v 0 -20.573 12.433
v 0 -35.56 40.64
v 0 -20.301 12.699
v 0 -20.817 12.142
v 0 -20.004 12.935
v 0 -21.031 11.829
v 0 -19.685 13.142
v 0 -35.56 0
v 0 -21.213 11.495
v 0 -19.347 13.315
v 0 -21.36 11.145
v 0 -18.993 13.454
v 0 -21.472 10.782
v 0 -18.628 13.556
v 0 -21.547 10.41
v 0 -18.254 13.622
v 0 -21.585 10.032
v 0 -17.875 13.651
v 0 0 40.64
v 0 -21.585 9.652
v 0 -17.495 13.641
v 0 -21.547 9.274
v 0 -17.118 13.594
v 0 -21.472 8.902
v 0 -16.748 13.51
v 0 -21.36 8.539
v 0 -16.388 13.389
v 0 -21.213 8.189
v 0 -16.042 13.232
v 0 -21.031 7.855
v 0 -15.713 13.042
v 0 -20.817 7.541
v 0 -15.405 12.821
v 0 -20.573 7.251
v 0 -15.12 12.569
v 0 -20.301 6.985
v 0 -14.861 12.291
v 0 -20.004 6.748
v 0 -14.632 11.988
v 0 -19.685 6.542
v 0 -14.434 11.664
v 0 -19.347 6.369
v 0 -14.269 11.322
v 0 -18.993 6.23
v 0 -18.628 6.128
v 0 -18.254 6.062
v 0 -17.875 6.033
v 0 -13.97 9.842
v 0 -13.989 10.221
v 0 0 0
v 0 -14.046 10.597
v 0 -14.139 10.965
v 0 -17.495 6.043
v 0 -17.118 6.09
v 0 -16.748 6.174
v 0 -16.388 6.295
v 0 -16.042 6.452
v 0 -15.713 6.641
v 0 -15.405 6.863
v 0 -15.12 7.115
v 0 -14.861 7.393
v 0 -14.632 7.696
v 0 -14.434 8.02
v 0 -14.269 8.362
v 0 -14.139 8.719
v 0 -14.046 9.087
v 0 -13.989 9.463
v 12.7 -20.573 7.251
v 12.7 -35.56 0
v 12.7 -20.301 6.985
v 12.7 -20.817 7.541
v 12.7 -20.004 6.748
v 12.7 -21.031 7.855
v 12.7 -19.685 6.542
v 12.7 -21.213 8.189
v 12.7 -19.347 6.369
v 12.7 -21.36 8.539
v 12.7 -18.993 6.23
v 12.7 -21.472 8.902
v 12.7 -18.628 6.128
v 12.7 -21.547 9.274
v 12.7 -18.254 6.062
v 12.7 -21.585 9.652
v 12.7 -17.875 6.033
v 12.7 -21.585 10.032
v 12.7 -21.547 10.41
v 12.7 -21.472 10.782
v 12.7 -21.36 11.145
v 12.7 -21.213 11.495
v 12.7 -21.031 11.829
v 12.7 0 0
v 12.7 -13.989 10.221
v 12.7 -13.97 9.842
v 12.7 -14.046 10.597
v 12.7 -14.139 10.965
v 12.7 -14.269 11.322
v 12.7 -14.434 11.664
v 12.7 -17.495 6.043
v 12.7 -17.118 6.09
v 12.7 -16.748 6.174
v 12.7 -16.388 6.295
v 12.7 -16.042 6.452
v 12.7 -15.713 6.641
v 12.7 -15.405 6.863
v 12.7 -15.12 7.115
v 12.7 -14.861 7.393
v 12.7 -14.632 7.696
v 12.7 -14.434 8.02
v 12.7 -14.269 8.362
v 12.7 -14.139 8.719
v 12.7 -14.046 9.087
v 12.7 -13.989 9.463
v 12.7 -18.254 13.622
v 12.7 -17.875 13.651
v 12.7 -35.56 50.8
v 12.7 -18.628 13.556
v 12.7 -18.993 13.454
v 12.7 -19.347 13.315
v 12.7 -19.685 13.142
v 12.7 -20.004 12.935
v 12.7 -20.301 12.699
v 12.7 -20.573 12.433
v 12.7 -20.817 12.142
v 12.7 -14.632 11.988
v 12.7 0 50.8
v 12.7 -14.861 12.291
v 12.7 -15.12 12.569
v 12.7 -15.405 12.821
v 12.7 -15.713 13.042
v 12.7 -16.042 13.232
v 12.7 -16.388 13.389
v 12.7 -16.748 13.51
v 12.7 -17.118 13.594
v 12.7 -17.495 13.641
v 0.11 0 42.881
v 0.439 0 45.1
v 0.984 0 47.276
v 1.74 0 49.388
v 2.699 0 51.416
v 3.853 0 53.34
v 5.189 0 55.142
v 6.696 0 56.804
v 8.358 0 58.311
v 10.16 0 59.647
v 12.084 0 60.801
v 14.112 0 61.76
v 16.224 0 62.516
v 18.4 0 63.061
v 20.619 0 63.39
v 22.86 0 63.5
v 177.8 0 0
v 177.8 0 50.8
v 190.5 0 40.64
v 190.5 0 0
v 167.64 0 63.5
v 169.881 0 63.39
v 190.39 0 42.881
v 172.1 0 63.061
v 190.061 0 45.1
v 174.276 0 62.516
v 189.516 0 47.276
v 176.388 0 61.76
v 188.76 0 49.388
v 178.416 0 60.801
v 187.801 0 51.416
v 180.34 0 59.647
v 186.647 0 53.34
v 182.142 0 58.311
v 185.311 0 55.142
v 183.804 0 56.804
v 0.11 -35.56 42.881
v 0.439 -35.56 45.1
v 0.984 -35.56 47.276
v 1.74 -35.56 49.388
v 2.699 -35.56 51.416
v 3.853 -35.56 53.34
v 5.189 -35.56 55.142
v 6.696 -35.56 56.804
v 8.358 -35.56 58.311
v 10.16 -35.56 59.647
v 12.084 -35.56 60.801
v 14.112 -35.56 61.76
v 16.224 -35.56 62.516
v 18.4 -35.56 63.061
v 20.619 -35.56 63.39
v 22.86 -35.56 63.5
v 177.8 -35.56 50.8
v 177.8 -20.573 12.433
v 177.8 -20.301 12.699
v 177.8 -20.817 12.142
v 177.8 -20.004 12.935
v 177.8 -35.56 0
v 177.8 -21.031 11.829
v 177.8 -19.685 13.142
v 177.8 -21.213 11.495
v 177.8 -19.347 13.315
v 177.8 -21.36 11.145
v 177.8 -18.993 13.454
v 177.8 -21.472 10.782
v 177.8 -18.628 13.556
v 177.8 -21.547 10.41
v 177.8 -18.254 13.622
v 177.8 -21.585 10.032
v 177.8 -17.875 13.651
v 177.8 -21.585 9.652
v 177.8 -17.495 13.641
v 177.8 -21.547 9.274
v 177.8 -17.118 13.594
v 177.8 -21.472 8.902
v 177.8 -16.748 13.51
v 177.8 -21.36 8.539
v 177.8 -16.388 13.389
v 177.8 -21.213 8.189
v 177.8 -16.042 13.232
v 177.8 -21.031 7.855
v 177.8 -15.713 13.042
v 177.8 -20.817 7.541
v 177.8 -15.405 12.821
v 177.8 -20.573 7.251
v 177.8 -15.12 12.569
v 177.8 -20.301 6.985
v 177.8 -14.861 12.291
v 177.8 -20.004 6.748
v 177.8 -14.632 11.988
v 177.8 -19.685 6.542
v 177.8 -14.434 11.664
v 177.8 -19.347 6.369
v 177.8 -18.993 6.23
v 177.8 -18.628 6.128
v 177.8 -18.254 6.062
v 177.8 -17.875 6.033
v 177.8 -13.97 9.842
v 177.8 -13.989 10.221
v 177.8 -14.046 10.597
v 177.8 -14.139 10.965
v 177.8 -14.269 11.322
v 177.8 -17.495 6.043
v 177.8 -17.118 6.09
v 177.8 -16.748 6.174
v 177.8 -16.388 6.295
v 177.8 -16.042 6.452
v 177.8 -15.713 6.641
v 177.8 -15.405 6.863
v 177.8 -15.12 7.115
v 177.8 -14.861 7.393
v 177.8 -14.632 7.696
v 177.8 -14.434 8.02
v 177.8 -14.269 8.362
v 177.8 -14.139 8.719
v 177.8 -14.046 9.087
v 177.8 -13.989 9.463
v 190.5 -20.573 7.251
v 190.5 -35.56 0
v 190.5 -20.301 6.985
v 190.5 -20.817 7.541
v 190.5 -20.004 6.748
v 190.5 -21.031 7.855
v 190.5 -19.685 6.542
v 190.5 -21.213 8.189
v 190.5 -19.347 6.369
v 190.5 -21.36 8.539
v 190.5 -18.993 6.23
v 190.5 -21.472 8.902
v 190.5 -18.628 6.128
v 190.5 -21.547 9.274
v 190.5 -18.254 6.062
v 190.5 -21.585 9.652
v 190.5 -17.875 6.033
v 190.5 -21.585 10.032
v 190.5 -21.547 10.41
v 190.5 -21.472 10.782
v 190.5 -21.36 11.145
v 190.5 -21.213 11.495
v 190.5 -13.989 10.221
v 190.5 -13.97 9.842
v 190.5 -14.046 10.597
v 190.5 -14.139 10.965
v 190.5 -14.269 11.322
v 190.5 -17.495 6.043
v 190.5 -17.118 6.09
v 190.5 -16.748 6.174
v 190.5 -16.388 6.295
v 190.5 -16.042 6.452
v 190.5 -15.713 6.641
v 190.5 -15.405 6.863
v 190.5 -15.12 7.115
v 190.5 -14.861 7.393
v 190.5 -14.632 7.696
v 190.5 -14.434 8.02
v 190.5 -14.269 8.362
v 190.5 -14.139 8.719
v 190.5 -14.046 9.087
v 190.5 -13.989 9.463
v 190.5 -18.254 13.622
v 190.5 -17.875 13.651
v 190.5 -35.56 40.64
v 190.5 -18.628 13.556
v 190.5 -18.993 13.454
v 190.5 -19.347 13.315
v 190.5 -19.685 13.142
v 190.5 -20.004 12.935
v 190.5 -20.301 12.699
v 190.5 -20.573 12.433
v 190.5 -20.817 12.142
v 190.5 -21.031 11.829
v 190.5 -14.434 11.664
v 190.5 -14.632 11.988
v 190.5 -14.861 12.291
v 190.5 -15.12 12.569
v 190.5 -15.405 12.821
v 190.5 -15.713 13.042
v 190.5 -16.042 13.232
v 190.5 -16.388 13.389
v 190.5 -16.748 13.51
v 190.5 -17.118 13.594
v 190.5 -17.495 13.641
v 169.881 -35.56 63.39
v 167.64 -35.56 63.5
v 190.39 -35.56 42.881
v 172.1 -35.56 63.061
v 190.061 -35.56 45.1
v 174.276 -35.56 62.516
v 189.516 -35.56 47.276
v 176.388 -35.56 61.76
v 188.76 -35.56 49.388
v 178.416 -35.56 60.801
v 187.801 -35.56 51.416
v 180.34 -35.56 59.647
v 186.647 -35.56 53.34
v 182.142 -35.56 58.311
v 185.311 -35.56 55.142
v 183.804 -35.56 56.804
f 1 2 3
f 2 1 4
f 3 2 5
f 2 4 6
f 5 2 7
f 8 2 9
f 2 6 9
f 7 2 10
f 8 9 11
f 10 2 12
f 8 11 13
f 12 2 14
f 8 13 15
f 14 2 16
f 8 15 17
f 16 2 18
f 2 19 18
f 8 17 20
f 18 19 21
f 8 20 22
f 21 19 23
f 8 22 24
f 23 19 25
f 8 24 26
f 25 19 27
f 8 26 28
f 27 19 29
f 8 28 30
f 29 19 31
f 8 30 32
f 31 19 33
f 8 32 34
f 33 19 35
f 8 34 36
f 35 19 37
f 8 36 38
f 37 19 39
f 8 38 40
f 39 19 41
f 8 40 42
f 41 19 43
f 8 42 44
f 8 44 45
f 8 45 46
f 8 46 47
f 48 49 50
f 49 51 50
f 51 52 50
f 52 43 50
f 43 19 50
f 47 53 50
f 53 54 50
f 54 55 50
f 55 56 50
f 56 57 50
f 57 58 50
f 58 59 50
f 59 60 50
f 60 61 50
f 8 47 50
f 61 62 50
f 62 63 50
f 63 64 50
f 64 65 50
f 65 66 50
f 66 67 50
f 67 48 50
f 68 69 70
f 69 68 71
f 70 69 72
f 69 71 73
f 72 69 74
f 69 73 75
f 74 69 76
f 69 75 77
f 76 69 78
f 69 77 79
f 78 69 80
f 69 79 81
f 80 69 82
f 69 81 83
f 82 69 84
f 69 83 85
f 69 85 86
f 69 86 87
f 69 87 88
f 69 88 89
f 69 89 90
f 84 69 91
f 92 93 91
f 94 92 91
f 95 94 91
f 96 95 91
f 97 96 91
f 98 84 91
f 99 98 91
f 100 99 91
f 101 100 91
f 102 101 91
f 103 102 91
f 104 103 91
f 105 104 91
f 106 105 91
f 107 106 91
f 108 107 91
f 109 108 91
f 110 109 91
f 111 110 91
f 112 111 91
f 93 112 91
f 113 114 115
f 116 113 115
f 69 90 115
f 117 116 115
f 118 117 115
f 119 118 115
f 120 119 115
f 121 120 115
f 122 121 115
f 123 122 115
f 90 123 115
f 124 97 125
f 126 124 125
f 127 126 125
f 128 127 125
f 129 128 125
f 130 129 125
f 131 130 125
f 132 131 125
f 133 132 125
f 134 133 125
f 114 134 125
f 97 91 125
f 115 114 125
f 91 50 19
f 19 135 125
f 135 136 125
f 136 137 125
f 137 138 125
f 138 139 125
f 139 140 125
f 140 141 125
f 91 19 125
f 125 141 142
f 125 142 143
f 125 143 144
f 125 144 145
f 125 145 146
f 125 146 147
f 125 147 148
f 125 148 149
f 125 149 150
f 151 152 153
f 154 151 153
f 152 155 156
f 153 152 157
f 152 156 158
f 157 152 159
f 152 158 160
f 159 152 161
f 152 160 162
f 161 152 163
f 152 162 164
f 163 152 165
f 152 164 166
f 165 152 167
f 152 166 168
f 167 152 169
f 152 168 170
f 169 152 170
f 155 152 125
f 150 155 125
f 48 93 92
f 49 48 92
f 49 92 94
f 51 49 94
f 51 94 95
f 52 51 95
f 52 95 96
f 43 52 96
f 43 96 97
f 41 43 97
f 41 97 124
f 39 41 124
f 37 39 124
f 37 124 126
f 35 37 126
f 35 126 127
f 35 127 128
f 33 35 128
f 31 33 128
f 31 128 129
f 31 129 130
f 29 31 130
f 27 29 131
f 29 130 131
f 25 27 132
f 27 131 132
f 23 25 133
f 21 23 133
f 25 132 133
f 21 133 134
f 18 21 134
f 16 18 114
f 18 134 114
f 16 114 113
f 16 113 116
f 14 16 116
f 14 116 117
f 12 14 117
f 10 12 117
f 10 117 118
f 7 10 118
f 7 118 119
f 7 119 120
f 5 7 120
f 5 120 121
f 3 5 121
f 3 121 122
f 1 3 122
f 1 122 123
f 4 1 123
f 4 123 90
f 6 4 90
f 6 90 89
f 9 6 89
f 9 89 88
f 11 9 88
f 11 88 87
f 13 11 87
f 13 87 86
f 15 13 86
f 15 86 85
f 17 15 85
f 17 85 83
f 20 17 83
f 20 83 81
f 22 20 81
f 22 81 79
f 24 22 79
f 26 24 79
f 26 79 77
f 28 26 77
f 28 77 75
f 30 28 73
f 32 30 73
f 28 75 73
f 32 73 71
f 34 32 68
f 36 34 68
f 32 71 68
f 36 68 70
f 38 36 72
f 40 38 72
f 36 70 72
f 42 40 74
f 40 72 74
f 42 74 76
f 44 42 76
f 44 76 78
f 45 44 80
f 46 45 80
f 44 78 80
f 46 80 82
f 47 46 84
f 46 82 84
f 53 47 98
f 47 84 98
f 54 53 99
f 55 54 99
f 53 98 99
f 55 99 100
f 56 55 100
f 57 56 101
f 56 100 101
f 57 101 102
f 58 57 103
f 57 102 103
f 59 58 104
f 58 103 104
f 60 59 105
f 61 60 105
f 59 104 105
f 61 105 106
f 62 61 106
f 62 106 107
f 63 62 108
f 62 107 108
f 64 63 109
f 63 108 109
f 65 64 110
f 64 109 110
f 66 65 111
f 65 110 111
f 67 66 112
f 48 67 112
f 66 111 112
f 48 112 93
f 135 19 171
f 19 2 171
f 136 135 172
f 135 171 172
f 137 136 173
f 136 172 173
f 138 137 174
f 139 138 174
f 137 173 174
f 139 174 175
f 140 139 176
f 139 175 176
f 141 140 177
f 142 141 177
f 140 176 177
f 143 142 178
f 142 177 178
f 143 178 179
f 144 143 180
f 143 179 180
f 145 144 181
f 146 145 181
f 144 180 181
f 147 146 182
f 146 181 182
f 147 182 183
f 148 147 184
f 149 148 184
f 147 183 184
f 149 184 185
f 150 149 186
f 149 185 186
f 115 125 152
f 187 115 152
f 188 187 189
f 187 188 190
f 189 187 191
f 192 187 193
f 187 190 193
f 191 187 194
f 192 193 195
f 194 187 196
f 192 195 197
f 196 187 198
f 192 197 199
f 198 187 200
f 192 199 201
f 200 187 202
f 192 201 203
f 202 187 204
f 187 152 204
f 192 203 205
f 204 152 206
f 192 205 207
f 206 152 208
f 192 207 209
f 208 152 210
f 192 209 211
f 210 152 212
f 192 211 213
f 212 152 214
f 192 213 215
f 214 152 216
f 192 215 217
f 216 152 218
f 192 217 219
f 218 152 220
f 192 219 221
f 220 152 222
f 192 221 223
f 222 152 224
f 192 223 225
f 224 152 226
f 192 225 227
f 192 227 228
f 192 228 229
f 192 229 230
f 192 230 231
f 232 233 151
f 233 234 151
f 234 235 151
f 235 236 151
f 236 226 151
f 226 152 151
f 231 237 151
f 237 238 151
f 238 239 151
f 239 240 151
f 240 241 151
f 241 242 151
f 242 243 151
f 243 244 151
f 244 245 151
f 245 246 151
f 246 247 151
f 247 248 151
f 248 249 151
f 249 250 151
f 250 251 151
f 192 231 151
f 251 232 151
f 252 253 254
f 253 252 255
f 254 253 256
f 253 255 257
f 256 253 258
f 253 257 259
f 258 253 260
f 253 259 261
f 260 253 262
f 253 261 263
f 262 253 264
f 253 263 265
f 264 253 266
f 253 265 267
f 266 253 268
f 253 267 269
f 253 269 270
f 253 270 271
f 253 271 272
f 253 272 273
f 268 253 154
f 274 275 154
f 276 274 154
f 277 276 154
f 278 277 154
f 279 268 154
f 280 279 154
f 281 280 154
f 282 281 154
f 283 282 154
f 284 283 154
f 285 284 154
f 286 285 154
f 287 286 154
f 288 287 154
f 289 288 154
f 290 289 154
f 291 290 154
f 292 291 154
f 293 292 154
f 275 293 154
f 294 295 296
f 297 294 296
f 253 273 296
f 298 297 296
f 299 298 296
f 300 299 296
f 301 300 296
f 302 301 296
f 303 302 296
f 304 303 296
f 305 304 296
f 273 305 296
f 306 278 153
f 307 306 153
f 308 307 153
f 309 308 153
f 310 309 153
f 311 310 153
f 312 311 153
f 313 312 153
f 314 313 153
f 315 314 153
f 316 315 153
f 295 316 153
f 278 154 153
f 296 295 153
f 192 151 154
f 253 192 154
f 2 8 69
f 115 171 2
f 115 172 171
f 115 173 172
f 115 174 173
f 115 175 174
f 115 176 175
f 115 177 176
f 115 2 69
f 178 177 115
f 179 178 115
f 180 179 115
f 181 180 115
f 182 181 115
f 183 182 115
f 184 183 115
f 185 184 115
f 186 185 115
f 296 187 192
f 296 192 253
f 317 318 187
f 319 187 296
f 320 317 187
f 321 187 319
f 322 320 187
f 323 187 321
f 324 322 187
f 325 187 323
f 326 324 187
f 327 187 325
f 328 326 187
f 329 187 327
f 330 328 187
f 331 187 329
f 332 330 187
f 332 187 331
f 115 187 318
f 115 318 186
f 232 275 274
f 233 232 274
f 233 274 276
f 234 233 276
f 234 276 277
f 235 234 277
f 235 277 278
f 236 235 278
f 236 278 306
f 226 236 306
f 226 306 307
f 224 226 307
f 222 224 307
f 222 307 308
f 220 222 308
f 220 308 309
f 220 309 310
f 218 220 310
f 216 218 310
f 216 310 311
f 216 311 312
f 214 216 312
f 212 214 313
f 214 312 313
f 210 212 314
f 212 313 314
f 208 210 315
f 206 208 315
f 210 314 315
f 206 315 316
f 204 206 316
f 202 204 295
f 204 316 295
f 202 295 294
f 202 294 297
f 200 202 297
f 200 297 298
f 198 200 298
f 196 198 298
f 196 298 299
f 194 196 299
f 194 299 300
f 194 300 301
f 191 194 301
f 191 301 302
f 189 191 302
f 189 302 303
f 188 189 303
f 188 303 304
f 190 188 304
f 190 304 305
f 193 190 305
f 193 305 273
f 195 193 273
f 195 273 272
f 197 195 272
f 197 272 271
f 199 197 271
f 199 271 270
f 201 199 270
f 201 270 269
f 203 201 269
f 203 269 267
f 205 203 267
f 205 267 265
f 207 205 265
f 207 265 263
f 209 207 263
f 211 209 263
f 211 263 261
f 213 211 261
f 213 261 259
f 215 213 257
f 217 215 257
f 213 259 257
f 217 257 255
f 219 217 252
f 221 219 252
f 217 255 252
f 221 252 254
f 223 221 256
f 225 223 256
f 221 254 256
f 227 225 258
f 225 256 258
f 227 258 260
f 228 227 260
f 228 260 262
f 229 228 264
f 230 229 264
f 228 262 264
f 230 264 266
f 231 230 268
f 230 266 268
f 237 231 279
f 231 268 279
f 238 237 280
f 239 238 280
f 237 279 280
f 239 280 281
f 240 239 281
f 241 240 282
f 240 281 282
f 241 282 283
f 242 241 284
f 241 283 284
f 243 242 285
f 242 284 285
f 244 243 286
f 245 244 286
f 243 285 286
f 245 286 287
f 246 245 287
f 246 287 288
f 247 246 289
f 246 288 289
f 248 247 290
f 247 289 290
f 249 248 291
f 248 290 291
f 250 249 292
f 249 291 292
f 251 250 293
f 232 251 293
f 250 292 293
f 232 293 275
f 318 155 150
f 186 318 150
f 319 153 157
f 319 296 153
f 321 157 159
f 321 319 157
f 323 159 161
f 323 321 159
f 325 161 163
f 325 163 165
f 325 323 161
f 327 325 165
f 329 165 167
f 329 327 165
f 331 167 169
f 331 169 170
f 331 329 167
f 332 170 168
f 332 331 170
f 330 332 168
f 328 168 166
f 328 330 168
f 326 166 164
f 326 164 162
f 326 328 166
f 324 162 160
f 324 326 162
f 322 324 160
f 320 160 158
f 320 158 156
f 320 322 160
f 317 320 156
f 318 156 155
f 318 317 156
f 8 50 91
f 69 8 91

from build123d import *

# Parameters (mm, degrees)
F1_DEPTH = 35.56
F2_R     = 22.86
F3_R     = 3.81
F4_DEPTH = 190.501


with BuildPart() as f1:
    # F0 (on Front) → F1 (new body)
    with BuildSketch(Plane.XZ):
        Polygon((0, 63.5), (0, 0), (12.7, 0), (12.7, 50.8), (177.8, 50.8), (177.8, 0), (190.5, 0), (190.5, 63.5), align=None)
    extrude(amount=F1_DEPTH)

    # F2
    f2_edges = [f1.edges().sort_by_distance(p)[0] for p in [
        (0, -17.78, 63.5),
        (190.5, -17.78, 63.5),
    ]]
    fillet(f2_edges, radius=F2_R)

    # F3 (on face) → F4 (cut, through all)
    with BuildSketch(Plane.YZ.offset(190.5)):
        with Locations((-17.78, 9.841981)):
            Circle(F3_R)
    extrude(amount=-F4_DEPTH, mode=Mode.SUBTRACT)


solid = f1.part
